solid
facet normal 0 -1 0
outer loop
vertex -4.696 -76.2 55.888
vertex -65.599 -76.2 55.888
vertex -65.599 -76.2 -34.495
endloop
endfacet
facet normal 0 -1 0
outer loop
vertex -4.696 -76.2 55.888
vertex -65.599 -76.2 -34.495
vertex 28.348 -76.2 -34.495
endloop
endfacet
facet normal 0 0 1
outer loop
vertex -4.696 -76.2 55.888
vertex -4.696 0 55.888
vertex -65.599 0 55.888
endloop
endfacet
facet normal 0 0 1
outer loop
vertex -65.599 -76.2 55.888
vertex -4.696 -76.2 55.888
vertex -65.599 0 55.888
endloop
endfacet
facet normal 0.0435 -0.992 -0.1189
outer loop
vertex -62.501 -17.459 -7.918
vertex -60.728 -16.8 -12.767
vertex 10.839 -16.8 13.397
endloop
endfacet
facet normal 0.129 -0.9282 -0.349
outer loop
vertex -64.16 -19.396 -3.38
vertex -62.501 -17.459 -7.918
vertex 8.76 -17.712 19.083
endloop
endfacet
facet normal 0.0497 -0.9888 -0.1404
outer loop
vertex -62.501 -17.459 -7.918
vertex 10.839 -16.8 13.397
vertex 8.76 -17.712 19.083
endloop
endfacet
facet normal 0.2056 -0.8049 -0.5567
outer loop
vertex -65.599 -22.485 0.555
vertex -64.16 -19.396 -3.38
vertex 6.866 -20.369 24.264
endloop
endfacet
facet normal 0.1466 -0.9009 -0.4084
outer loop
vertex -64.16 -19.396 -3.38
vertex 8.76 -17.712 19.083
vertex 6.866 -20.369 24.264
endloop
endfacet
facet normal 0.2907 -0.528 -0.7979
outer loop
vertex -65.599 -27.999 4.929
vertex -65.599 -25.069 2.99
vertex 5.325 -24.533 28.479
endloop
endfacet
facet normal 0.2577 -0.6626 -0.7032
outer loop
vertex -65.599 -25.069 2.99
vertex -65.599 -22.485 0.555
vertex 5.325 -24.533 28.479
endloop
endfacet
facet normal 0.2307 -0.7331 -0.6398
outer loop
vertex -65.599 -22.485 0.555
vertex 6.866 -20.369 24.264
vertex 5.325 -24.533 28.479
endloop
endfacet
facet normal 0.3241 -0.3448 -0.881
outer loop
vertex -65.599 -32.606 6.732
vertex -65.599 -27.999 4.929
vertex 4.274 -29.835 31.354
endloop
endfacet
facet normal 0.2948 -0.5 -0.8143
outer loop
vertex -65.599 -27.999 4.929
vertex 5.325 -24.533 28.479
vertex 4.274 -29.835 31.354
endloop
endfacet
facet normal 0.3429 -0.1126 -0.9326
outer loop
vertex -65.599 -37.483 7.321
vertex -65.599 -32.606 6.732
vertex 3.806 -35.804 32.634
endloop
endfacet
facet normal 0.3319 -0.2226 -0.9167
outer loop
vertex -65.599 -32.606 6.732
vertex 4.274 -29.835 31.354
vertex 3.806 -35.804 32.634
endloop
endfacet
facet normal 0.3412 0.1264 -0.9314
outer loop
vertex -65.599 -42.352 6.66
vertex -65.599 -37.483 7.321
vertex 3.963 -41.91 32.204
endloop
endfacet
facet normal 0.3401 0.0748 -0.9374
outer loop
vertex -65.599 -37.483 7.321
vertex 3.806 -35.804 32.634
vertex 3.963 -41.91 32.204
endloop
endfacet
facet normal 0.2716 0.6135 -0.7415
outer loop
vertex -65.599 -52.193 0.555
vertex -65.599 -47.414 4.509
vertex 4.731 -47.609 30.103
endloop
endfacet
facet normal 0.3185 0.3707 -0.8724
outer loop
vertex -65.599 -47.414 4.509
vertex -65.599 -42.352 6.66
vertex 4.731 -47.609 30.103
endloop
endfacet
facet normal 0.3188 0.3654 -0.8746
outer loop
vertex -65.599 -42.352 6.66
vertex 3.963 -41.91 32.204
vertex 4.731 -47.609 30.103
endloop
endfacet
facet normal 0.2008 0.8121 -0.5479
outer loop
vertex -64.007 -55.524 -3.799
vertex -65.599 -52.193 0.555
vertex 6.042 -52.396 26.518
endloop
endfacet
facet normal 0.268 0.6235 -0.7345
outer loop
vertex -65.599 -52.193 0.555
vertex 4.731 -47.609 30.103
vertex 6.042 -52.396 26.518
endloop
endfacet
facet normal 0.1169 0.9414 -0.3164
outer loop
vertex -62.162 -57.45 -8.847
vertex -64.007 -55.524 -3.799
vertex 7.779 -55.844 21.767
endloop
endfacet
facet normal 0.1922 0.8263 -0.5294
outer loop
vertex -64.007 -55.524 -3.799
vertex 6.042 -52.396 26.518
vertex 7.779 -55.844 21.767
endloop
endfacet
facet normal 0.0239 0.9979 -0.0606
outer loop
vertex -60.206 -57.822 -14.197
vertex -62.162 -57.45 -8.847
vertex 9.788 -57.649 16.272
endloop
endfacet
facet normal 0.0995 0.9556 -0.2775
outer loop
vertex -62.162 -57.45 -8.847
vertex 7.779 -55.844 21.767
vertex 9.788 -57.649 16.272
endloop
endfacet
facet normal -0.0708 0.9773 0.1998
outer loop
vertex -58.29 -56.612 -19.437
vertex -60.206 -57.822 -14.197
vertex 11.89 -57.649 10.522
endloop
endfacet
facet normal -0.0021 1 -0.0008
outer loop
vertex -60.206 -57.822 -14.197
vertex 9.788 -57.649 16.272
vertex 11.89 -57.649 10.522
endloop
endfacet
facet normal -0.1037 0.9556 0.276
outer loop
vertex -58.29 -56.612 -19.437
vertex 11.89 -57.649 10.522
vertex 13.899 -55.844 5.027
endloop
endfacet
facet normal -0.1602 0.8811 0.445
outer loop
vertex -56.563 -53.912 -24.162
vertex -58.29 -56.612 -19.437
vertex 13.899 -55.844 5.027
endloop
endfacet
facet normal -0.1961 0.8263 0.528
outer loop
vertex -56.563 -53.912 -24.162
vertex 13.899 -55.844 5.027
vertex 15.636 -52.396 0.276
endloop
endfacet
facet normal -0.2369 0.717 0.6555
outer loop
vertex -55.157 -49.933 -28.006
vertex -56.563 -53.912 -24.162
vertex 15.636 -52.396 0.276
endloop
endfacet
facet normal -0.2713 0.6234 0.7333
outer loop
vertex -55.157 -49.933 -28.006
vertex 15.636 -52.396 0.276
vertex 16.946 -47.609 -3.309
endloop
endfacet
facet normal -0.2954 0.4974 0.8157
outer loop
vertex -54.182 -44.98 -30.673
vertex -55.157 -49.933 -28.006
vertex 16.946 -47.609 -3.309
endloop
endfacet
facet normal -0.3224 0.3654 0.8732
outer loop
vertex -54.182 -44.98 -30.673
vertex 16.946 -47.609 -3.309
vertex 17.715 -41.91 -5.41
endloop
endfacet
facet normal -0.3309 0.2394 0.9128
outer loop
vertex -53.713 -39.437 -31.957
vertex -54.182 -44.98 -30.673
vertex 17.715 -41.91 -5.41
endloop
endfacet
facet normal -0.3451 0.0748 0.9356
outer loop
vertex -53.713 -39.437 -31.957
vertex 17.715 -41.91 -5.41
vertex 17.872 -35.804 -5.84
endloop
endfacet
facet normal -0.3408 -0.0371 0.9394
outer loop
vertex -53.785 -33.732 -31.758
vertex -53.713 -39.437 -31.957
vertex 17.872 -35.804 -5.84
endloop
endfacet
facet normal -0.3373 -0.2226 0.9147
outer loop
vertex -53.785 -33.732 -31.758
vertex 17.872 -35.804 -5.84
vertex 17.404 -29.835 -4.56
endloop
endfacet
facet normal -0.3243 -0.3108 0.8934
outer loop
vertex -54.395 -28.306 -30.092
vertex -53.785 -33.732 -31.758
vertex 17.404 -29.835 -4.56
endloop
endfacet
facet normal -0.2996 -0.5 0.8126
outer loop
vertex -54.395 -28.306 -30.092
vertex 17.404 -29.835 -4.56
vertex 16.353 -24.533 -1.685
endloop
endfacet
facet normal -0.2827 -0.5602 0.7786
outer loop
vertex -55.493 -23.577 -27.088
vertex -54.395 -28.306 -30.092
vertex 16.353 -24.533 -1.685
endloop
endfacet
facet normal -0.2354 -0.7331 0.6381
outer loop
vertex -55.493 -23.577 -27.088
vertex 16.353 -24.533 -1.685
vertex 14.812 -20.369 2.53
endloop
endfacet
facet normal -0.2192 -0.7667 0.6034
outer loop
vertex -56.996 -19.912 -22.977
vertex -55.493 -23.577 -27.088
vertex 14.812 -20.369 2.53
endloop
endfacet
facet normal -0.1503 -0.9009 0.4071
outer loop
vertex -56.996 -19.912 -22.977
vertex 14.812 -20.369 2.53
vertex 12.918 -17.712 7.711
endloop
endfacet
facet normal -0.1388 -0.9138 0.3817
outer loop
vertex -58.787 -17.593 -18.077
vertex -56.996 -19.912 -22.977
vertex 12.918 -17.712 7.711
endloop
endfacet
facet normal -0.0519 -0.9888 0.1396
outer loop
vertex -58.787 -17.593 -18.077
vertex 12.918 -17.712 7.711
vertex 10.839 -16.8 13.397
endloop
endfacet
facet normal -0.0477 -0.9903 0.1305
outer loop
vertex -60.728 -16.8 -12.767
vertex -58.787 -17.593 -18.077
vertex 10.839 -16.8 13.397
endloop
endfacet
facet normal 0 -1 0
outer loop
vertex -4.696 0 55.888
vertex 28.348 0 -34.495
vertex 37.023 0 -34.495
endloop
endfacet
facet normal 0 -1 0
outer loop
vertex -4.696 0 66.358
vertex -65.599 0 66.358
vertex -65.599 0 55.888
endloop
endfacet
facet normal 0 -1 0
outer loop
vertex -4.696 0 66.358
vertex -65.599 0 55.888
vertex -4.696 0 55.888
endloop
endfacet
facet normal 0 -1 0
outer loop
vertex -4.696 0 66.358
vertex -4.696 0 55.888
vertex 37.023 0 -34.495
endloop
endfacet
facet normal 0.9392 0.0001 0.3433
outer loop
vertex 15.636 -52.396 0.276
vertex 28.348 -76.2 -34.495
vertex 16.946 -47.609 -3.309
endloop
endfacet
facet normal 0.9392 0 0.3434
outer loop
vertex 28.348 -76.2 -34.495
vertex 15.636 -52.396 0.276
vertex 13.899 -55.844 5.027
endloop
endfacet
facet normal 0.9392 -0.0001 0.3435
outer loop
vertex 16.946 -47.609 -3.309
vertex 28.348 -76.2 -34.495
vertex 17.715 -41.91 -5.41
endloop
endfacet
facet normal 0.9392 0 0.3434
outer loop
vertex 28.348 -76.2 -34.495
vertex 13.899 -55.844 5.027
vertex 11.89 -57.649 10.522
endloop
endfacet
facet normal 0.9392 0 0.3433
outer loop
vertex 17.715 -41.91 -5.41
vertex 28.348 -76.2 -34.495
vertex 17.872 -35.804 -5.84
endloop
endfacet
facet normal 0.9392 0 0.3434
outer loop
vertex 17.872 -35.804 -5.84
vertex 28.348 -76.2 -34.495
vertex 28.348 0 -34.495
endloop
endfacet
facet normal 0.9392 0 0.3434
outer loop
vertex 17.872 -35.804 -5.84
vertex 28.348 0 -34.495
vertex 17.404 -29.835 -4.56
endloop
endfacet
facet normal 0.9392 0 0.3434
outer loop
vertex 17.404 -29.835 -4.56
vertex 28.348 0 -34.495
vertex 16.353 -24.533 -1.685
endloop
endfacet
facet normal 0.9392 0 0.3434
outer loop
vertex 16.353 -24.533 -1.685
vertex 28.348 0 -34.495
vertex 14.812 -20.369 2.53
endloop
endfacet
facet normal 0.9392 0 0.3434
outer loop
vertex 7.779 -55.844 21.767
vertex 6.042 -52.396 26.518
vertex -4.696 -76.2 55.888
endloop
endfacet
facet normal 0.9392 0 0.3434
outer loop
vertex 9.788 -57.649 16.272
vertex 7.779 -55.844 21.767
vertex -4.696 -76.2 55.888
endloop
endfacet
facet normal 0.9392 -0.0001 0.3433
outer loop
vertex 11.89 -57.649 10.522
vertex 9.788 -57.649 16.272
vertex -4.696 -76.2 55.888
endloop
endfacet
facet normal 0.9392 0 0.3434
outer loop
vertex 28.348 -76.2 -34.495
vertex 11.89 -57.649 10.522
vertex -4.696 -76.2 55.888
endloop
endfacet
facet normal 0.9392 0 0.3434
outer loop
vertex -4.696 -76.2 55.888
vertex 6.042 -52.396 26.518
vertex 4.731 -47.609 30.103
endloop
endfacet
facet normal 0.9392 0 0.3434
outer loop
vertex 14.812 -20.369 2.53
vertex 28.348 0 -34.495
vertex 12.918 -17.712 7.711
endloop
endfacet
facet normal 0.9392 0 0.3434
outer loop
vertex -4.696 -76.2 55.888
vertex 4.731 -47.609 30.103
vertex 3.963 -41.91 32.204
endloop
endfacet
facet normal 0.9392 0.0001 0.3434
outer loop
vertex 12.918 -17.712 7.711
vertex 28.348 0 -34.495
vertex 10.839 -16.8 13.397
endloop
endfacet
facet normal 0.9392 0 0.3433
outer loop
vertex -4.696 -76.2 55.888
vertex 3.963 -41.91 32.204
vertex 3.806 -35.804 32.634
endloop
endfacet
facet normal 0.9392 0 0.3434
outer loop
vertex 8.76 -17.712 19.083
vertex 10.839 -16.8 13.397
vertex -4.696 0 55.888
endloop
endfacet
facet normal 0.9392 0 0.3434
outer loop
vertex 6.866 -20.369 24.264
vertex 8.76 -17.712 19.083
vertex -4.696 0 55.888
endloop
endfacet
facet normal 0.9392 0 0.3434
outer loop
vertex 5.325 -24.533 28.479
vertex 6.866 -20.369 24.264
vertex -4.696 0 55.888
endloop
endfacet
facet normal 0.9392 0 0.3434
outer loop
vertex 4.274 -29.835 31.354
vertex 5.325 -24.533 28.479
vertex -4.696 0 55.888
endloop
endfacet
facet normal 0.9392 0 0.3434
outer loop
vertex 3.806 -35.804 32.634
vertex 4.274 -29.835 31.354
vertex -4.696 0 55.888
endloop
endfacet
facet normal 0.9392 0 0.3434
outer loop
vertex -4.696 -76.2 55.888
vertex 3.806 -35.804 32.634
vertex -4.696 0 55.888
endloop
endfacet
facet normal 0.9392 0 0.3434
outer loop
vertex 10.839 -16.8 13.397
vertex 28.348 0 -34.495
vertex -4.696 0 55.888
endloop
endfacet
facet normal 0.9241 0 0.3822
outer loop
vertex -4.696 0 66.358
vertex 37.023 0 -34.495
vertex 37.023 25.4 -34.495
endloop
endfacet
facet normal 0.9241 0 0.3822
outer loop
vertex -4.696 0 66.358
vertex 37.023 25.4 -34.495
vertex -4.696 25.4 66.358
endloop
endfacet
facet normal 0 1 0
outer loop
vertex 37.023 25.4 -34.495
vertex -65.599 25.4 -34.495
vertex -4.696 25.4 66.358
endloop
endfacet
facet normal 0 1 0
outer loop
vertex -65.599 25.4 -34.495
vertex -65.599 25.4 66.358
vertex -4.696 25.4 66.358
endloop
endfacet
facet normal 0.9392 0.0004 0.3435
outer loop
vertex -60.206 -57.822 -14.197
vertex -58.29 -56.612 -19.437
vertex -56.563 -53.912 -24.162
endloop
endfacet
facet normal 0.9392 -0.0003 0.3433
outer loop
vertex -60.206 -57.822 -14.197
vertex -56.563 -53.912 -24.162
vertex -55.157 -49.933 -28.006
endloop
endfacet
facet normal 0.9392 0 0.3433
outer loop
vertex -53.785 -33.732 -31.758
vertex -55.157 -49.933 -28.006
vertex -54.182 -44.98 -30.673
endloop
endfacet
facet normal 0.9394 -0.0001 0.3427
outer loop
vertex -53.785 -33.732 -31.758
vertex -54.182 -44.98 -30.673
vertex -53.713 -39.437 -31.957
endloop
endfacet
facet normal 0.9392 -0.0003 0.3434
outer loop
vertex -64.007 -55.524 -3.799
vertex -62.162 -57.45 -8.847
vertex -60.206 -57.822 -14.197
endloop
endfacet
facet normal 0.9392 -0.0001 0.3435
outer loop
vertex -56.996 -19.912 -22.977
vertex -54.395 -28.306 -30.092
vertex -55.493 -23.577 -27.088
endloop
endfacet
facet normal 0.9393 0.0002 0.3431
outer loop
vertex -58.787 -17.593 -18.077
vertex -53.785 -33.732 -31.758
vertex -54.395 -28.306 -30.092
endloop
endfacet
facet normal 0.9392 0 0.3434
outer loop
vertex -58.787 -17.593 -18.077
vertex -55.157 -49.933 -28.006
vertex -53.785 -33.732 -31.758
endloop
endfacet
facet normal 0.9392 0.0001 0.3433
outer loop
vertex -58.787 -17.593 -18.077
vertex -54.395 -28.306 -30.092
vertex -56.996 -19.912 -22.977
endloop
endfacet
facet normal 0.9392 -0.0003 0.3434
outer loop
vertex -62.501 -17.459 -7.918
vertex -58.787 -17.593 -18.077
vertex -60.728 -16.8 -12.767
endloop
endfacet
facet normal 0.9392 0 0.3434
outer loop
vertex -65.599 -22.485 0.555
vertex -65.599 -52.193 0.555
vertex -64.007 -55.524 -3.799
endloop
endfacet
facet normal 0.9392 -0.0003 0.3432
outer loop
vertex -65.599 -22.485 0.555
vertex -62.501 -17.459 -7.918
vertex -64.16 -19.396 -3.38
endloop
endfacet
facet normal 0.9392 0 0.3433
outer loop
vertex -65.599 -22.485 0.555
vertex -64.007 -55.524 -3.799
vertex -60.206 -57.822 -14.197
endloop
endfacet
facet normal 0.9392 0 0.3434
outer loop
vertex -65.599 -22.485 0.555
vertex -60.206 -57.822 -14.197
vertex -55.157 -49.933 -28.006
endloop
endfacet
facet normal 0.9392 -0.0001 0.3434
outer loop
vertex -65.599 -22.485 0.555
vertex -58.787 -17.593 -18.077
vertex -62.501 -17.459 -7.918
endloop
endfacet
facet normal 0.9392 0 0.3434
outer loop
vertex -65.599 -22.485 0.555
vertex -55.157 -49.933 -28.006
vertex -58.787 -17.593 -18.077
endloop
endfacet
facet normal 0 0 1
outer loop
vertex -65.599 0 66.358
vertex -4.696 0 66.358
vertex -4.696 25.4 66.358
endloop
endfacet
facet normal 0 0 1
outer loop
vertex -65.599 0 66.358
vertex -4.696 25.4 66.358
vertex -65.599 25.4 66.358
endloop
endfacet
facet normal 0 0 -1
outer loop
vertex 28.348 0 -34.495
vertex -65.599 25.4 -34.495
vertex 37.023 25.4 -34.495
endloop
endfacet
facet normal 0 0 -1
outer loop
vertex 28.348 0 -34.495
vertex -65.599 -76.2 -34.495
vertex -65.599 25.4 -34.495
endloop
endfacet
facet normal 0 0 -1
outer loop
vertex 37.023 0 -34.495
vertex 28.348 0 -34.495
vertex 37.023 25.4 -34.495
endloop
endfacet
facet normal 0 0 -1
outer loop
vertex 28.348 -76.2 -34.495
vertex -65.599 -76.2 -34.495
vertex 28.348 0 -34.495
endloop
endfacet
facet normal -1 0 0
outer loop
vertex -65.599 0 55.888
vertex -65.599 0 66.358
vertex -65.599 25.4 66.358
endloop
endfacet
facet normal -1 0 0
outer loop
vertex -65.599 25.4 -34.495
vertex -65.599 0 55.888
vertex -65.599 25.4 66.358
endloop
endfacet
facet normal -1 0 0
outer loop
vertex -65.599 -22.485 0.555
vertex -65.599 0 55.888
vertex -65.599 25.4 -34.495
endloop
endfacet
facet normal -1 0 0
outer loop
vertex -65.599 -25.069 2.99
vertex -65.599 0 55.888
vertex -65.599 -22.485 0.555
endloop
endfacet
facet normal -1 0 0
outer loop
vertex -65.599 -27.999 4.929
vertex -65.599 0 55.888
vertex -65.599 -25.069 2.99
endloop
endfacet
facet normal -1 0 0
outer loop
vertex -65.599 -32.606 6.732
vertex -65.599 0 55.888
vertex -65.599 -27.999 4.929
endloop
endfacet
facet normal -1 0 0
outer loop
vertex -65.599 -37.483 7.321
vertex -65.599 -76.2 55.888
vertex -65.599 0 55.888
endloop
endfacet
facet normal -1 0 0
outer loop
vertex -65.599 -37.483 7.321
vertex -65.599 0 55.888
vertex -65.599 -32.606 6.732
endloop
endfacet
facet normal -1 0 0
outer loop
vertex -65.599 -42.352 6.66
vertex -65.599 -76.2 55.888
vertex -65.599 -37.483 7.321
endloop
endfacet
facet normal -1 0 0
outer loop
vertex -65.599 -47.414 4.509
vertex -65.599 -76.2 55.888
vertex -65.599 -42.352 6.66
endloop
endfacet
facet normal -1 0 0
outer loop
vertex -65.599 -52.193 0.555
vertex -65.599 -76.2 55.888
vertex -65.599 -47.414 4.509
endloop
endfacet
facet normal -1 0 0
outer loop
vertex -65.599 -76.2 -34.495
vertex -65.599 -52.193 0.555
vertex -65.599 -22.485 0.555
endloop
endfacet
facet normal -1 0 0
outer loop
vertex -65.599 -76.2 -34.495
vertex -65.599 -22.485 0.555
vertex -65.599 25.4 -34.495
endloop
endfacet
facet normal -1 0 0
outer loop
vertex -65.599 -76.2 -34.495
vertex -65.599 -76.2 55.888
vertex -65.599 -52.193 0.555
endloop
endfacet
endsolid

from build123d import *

# Parameters (mm, degrees)
F1_DEPTH = 76.2
F2_DEPTH = 25.4
F3_R     = 20.5394325034
F4_DEPTH = 76.2


with BuildPart() as f1:
    # F0 (on Front) → F1 (new body)
    with BuildSketch(Plane.XZ):
        Polygon((-4.6956427395, 55.8883473277), (-65.5990689993, 55.8883473277), (-65.5990689993, -34.4946607947), (28.3477045596, -34.4946607947), align=None)
    extrude(amount=F1_DEPTH)

    # F0 (on Front) → F2 (join)
    with BuildSketch(Plane.XZ):
        Polygon((-4.6956427395, 55.8883473277), (-65.5990689993, 55.8883473277), (-65.5990689993, -34.4946607947), (28.3477045596, -34.4946607947), align=None)
        Polygon((-65.5990689993, 66.358409822), (-65.5990689993, 55.8883473277), (-4.6956427395, 55.8883473277), (28.3477045596, -34.4946607947), (37.022896111, -34.4946607947), (-4.6956427395, 66.358409822), align=None)
    extrude(amount=-F2_DEPTH)

    # F3 (on face) → F4 (cut)
    with BuildSketch(Plane(origin=(13.8813630625, 0, 5.0749218264), x_dir=(0, 1, 0), z_dir=(0.9392019794, 0, 0.3433651727))):
        with Locations((-37.3390875757, 8.860943839)):
            Circle(F3_R)
    extrude(amount=-F4_DEPTH, mode=Mode.SUBTRACT)


solid = f1.part
